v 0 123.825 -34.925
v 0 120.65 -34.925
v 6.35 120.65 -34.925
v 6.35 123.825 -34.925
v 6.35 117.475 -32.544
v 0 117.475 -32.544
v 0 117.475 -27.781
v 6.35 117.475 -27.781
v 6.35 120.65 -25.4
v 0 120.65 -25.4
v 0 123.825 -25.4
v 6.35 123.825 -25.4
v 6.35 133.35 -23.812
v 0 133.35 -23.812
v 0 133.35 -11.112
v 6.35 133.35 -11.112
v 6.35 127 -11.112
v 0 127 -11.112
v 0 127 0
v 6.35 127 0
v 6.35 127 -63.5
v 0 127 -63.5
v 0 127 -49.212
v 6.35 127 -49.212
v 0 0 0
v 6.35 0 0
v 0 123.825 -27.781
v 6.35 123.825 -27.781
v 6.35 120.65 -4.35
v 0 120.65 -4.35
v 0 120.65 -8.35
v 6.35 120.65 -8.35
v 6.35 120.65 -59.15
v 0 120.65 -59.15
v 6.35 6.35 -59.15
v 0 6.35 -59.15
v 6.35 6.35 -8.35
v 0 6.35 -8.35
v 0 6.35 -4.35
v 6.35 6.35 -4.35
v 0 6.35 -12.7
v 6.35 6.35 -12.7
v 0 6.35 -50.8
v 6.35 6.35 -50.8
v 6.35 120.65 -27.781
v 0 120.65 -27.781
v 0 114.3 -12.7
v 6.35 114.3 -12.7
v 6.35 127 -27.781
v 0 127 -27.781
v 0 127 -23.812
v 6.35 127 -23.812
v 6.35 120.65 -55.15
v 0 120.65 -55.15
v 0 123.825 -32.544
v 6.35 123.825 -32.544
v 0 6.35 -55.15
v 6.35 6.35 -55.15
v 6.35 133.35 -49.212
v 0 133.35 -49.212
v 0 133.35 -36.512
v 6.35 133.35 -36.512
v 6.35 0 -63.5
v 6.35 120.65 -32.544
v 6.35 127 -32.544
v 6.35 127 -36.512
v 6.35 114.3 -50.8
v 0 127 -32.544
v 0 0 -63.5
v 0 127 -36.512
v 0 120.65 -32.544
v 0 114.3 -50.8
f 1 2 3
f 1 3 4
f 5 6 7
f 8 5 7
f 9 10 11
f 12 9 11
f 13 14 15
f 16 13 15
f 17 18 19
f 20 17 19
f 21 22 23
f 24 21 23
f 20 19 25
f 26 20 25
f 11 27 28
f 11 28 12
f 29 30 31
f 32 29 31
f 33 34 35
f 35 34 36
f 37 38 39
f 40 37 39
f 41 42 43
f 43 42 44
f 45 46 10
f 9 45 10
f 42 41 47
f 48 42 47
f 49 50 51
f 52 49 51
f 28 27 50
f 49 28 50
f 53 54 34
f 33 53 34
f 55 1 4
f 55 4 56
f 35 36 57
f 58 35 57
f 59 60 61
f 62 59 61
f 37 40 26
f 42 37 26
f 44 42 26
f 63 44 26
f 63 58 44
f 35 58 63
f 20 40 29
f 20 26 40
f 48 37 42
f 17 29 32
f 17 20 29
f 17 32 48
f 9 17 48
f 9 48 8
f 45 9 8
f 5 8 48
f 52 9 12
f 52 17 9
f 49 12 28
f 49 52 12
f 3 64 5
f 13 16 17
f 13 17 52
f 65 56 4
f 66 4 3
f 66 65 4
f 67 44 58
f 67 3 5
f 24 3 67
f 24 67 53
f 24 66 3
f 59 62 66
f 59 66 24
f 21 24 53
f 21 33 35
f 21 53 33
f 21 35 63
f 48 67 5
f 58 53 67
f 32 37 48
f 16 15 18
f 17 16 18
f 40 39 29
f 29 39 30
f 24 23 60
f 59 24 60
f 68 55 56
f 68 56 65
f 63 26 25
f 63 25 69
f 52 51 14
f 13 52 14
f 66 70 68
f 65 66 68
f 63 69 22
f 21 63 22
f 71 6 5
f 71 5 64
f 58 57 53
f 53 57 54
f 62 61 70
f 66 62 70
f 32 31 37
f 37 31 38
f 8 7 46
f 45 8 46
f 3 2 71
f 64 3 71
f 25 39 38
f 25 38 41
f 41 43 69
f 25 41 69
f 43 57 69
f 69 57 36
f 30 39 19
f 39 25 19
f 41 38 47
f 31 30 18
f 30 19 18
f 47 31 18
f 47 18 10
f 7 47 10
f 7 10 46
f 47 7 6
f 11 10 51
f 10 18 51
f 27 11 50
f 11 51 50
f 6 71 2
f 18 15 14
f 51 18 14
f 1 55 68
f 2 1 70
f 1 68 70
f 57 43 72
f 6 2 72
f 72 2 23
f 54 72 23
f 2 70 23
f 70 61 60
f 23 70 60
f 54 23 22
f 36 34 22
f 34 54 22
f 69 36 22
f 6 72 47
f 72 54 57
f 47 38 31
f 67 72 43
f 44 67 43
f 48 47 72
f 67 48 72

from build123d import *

# Parameters (mm, degrees)
BOSS_EXTRUDE1_DEPTH = 6.35
SKETCH4_W           = 4.7625
SKETCH4_H           = 9.525
SKETCH4_W_2         = 9.525
SKETCH4_H_2         = 3.175
CUT_EXTRUDE1_DEPTH  = 6.35
SKETCH6_W           = 38.1
SKETCH6_H           = 6.35
BOSS_EXTRUDE3_DEPTH = 6.35


with BuildPart() as part:
    # Sketch2 → Boss-Extrude1 (new body)
    with BuildSketch(Plane(origin=(0, 0, 0), x_dir=(0, 0, -1), z_dir=(1, 0, 0))):
        Polygon((0, 127), (0, 0), (12.7, 0), (12.7, 114.3), (15.875, 114.3), (50.8, 114.3), (50.8, 0), (63.5, 0), (63.5, 114.3), (63.5, 127), (49.2125, 127), (49.2125, 133.35), (36.5125, 133.35), (36.5125, 127), (23.8125, 127), (23.8125, 133.35), (11.1125, 133.35), (11.1125, 127), align=None)
        Polygon((4.35, 6.35), (4.35, 120.65), (6.35, 120.65), (8.35, 120.65), (8.35, 6.35), align=None, mode=Mode.SUBTRACT)
        Polygon((59.15, 120.65), (59.15, 114.3), (59.15, 6.35), (55.15, 6.35), (55.15, 114.3), (55.15, 120.65), (57.15, 120.65), align=None, mode=Mode.SUBTRACT)
    extrude(amount=BOSS_EXTRUDE1_DEPTH)

    # Sketch4 → Cut-Extrude1 (cut)
    with BuildSketch(Plane.ZY):
        with Locations((-30.1625, 122.2375)):
            Rectangle(SKETCH4_W, SKETCH4_H)
        with Locations((-30.1625, 122.2375)):
            Rectangle(SKETCH4_W_2, SKETCH4_H_2)
    extrude(amount=-CUT_EXTRUDE1_DEPTH, mode=Mode.SUBTRACT)

    # Sketch6 → Boss-Extrude3 (add)
    with BuildSketch(Plane(origin=(6.35, 0, 0), x_dir=(0, 0, -1), z_dir=(1, 0, 0))):
        with Locations((31.75, 3.175)):
            Rectangle(SKETCH6_W, SKETCH6_H)
    extrude(amount=-BOSS_EXTRUDE3_DEPTH)


solid = part.part
